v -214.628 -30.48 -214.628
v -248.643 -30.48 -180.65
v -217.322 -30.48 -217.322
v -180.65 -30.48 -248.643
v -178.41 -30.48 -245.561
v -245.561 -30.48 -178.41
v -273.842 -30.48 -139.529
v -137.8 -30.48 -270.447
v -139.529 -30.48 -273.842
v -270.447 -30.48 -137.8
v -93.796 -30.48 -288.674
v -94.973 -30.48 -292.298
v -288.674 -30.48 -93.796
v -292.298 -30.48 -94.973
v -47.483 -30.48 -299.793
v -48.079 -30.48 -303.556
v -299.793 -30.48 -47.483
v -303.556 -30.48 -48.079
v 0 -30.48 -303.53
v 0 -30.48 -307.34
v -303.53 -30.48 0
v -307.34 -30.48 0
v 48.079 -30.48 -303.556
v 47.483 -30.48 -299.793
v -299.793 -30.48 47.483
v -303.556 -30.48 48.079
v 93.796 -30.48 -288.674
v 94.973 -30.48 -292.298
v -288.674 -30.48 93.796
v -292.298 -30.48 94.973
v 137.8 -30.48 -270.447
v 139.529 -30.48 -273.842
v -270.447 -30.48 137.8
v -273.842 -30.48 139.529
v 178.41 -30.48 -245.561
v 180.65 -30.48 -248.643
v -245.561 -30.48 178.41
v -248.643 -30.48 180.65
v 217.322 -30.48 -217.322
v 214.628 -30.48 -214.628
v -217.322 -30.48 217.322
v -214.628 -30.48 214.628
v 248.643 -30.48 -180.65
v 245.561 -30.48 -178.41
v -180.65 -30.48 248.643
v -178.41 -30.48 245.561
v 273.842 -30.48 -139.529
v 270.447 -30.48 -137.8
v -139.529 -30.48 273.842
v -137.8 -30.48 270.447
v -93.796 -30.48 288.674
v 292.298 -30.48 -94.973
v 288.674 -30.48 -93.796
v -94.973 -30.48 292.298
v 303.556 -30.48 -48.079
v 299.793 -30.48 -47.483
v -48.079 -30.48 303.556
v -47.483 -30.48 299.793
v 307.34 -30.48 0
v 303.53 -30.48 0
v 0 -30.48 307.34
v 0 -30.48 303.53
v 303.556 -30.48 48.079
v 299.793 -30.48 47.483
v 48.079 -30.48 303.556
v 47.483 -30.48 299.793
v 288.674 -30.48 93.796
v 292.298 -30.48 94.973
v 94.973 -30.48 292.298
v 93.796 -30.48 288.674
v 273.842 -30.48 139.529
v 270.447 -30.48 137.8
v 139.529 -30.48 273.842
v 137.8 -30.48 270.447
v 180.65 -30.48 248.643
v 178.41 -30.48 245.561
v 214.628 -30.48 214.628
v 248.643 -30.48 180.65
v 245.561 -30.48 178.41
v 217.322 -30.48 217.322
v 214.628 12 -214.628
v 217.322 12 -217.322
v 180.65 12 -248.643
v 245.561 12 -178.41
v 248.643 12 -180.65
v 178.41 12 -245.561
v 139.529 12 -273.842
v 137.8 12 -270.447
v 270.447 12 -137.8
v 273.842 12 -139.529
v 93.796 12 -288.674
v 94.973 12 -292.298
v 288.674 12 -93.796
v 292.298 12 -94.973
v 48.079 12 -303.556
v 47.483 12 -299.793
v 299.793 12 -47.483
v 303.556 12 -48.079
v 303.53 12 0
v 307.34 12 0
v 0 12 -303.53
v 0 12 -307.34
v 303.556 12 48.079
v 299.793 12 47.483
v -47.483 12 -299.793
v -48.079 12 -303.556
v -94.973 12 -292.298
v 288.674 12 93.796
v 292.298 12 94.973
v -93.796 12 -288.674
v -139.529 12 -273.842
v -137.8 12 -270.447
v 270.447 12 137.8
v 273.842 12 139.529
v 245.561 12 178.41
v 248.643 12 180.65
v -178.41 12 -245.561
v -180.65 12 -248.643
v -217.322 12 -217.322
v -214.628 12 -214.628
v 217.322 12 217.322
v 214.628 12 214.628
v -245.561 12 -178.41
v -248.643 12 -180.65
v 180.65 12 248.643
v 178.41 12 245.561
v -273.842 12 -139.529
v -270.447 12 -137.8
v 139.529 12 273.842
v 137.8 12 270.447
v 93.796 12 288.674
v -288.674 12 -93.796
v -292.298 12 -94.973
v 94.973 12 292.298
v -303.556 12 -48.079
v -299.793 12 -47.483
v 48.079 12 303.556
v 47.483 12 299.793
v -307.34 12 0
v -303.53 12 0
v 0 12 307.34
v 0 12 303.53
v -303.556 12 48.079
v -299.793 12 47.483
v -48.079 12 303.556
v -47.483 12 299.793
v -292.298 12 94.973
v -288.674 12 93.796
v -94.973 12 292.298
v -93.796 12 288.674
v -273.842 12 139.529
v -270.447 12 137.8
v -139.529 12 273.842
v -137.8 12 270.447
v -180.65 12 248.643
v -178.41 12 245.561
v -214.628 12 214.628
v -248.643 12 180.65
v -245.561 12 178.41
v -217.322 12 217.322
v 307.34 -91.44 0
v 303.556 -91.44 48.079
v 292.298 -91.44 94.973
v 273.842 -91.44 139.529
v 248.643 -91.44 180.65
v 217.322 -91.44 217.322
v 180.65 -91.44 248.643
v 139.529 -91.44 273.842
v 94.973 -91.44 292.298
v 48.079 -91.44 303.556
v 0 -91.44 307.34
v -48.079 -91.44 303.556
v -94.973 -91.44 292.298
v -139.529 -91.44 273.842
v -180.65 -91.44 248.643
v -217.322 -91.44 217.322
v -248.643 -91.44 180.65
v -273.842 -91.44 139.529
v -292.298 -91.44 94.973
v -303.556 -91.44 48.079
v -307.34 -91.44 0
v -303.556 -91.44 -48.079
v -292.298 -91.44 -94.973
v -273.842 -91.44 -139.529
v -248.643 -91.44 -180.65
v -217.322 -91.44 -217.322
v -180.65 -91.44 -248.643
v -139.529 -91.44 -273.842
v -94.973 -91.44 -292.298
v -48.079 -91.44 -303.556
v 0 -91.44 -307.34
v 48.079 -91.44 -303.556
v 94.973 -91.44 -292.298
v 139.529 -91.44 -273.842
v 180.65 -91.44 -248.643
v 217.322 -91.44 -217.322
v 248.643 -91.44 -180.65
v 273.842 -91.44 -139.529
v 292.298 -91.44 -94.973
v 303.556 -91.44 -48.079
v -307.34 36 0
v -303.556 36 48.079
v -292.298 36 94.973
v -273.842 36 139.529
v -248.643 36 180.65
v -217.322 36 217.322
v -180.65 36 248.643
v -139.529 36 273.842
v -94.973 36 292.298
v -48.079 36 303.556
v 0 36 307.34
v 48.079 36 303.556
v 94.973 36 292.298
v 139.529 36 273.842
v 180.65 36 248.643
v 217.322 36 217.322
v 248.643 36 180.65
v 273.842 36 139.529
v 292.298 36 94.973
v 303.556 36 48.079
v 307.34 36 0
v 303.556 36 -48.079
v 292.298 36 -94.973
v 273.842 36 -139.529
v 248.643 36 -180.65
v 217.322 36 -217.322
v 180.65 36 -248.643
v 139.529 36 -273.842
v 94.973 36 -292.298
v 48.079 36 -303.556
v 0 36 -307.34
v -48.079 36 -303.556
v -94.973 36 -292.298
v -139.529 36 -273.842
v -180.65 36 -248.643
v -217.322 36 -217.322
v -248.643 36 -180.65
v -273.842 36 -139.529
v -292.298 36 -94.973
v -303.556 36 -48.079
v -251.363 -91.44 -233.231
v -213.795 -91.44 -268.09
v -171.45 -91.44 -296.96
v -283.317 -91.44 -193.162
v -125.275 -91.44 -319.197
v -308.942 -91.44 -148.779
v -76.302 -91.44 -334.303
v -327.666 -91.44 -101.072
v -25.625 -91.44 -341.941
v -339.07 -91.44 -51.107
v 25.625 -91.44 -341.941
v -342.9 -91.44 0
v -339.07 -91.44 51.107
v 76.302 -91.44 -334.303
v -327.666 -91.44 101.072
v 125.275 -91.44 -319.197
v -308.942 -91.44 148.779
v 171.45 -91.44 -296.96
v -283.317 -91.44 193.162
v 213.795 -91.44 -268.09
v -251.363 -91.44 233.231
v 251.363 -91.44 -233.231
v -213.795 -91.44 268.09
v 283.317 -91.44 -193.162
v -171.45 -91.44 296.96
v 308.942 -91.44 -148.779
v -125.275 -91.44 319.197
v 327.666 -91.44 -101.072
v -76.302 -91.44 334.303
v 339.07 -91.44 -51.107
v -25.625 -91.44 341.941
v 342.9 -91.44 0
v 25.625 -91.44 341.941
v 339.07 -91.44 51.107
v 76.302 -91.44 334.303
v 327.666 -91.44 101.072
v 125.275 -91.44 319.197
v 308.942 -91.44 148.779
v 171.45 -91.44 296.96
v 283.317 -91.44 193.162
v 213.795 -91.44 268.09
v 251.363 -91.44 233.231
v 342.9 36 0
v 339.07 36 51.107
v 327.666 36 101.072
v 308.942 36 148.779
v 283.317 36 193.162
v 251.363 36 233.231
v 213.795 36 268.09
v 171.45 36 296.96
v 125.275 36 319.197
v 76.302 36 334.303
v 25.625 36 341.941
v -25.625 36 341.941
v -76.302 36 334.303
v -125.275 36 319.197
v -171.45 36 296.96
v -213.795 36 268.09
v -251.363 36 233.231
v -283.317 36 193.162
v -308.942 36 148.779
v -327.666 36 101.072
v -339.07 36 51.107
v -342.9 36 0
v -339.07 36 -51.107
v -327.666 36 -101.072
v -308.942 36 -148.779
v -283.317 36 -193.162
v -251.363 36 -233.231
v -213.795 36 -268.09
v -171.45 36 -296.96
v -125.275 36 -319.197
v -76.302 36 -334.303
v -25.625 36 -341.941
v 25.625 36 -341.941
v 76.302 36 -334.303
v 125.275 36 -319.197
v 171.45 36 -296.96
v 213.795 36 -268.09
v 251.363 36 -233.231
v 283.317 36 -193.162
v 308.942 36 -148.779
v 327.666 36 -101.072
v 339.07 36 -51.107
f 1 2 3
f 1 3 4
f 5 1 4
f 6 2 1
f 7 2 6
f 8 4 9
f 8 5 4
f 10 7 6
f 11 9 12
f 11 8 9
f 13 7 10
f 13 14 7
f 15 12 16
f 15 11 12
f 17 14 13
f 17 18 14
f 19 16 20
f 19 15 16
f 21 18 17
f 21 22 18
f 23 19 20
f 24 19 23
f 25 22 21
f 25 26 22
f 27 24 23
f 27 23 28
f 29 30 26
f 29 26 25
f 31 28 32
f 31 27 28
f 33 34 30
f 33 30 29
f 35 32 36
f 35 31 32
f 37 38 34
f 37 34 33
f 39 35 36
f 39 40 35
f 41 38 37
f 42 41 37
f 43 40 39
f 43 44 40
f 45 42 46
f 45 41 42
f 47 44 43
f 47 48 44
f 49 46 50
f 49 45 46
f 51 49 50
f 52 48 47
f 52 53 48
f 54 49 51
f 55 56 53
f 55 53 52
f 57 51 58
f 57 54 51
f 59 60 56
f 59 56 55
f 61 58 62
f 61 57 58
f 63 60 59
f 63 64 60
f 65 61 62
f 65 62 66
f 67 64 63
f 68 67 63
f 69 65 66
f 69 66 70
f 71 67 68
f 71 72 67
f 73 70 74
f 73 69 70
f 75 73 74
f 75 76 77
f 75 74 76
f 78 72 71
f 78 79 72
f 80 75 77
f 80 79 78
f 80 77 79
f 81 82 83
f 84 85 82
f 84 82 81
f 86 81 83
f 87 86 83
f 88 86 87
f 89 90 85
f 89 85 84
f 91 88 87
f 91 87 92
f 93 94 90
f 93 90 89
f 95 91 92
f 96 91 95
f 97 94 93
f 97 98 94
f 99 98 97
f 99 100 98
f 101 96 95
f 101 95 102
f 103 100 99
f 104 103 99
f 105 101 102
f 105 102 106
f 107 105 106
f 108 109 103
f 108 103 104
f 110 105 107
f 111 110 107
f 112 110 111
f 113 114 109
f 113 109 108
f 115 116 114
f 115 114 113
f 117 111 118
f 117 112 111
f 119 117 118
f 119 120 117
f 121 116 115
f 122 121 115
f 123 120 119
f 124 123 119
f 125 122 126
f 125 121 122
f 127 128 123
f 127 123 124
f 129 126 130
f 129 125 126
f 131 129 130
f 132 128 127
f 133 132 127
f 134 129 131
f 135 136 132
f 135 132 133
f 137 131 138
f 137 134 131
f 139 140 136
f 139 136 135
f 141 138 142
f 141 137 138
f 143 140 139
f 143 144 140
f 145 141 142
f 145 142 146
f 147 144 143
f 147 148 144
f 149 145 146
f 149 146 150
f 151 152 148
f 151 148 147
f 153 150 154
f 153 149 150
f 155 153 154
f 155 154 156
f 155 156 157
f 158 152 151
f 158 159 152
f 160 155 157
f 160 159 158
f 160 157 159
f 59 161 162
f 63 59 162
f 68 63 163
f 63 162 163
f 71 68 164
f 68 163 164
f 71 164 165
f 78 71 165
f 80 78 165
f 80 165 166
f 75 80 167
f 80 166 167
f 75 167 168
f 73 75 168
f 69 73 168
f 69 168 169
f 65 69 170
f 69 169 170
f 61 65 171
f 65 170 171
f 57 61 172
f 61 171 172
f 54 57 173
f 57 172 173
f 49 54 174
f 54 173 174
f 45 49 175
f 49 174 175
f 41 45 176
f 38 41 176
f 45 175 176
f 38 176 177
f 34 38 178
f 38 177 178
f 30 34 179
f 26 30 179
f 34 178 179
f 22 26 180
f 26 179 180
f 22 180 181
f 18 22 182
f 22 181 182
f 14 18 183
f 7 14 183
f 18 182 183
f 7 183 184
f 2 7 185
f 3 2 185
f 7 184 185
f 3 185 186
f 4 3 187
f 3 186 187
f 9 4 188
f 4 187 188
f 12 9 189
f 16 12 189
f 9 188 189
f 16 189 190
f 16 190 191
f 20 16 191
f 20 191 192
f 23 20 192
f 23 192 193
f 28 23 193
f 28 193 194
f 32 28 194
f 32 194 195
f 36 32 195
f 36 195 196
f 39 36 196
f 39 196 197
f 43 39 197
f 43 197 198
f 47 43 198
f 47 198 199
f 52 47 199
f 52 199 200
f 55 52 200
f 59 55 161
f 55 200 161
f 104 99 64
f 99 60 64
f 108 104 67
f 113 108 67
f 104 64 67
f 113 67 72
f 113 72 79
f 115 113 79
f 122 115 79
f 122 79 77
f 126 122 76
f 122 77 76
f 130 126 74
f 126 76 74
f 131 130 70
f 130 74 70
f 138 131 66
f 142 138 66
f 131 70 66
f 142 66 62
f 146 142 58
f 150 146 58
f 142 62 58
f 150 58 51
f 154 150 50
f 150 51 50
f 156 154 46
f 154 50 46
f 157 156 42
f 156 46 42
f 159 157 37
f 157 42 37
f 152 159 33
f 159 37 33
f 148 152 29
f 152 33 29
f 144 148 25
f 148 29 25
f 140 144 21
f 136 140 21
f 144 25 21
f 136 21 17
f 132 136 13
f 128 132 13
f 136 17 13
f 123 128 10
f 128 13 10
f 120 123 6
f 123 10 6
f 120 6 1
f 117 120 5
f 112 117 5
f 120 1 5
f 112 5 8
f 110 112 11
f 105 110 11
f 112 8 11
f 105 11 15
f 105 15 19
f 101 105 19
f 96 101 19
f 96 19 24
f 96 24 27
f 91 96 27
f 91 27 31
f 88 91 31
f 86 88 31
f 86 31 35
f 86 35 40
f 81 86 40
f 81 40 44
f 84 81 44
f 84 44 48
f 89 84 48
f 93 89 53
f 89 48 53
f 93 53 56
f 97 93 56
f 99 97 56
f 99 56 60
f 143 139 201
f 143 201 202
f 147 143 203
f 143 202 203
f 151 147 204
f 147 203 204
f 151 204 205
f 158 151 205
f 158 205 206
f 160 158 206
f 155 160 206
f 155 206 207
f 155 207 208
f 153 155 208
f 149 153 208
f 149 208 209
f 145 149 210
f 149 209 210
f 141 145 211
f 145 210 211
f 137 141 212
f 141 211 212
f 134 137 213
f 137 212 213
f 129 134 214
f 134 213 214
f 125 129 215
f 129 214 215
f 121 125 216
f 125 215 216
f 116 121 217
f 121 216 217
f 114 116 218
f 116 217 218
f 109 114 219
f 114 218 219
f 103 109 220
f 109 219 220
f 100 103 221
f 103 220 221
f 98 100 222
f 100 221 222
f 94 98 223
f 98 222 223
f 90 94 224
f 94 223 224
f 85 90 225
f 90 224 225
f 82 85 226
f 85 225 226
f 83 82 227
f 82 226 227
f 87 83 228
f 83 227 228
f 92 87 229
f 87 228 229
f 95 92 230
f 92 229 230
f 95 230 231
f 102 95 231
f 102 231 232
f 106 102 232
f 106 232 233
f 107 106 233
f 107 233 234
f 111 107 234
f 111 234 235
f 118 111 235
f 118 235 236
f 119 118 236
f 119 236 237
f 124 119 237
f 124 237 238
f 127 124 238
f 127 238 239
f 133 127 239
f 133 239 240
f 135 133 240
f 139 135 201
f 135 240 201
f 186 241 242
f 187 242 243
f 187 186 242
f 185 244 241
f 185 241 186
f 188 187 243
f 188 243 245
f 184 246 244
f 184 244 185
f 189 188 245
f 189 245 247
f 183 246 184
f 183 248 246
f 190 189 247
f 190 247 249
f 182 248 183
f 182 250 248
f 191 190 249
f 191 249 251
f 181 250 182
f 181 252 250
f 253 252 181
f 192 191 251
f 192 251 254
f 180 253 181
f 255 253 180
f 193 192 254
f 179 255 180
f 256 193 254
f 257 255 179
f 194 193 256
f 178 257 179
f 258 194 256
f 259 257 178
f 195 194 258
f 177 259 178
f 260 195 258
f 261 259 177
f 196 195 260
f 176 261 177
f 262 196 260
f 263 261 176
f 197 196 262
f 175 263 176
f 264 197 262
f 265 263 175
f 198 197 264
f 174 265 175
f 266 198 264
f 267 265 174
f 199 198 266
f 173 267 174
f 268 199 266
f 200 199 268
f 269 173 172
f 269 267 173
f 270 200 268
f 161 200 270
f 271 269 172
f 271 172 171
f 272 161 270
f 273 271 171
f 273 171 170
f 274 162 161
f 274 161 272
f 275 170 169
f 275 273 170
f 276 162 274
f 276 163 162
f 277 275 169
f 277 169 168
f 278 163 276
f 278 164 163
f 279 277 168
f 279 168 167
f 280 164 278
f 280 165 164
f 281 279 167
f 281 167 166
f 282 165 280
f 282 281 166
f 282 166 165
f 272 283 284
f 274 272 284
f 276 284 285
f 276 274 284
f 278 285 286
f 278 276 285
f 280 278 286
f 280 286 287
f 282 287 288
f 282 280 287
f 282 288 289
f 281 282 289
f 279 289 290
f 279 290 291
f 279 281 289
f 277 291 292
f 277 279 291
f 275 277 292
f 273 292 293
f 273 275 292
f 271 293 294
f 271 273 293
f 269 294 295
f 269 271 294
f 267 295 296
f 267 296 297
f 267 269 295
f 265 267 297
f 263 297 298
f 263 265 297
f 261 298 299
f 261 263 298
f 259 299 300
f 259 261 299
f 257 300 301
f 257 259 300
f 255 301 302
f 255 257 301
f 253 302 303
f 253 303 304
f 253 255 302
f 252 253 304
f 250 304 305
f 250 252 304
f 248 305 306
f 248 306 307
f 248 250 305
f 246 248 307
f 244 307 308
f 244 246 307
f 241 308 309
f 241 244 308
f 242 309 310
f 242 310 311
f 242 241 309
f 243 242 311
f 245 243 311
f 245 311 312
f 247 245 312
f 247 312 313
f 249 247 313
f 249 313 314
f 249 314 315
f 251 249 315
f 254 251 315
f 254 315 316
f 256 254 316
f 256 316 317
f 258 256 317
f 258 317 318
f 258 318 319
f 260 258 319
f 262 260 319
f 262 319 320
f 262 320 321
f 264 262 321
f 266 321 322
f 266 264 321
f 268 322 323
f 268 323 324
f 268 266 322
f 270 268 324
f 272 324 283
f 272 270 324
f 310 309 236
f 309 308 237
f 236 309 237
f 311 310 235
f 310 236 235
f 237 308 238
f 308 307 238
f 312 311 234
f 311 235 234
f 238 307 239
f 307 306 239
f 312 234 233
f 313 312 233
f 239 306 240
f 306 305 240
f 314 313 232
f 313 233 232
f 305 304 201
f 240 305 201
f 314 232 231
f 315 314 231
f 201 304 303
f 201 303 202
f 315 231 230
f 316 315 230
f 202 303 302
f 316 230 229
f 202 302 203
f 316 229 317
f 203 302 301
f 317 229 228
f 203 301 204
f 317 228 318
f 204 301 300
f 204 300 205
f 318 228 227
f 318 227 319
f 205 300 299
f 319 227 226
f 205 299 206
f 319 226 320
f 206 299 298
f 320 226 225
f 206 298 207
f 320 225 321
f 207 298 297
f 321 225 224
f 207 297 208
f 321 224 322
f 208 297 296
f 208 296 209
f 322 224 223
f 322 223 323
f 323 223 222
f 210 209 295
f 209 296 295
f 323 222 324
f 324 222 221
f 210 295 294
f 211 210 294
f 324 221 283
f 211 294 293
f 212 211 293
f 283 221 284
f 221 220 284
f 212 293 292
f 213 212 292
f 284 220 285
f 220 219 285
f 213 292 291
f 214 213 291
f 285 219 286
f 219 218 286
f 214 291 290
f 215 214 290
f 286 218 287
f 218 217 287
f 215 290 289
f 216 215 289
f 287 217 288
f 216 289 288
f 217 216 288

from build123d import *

# Parameters (mm, degrees)
F0_R          = 342.9
F0_R_2        = 303.53
F1_DEPTH      = 91.44
F1_DEPTH_BACK = 36
F2_R          = 307.34
F2_R_2        = 303.53
F3_DEPTH      = 60.96
F4_R          = 307.34
F4_R_2        = 303.53
F5_DEPTH      = 24


with BuildPart() as f1:
    # F0 (on Front) → F1 (new body, two sides)
    with BuildSketch(Plane.XZ) as f1_sk:
        Circle(F0_R)
        Circle(F0_R_2, mode=Mode.SUBTRACT)
    extrude(amount=F1_DEPTH)
    extrude(f1_sk.sketch, amount=-F1_DEPTH_BACK)

    # F2 (on face) → F3 (cut)
    with BuildSketch(Plane.XZ.offset(91.44)):
        Circle(F2_R)
        Circle(F2_R_2, mode=Mode.SUBTRACT)
    extrude(amount=-F3_DEPTH, mode=Mode.SUBTRACT)

    # F4 (on face) → F5 (cut)
    with BuildSketch(Plane(origin=(0, 36, 0), x_dir=(-1, 0, 0), z_dir=(0, 1, 0))):
        Circle(F4_R)
        Circle(F4_R_2, mode=Mode.SUBTRACT)
    extrude(amount=-F5_DEPTH, mode=Mode.SUBTRACT)


solid = f1.part
